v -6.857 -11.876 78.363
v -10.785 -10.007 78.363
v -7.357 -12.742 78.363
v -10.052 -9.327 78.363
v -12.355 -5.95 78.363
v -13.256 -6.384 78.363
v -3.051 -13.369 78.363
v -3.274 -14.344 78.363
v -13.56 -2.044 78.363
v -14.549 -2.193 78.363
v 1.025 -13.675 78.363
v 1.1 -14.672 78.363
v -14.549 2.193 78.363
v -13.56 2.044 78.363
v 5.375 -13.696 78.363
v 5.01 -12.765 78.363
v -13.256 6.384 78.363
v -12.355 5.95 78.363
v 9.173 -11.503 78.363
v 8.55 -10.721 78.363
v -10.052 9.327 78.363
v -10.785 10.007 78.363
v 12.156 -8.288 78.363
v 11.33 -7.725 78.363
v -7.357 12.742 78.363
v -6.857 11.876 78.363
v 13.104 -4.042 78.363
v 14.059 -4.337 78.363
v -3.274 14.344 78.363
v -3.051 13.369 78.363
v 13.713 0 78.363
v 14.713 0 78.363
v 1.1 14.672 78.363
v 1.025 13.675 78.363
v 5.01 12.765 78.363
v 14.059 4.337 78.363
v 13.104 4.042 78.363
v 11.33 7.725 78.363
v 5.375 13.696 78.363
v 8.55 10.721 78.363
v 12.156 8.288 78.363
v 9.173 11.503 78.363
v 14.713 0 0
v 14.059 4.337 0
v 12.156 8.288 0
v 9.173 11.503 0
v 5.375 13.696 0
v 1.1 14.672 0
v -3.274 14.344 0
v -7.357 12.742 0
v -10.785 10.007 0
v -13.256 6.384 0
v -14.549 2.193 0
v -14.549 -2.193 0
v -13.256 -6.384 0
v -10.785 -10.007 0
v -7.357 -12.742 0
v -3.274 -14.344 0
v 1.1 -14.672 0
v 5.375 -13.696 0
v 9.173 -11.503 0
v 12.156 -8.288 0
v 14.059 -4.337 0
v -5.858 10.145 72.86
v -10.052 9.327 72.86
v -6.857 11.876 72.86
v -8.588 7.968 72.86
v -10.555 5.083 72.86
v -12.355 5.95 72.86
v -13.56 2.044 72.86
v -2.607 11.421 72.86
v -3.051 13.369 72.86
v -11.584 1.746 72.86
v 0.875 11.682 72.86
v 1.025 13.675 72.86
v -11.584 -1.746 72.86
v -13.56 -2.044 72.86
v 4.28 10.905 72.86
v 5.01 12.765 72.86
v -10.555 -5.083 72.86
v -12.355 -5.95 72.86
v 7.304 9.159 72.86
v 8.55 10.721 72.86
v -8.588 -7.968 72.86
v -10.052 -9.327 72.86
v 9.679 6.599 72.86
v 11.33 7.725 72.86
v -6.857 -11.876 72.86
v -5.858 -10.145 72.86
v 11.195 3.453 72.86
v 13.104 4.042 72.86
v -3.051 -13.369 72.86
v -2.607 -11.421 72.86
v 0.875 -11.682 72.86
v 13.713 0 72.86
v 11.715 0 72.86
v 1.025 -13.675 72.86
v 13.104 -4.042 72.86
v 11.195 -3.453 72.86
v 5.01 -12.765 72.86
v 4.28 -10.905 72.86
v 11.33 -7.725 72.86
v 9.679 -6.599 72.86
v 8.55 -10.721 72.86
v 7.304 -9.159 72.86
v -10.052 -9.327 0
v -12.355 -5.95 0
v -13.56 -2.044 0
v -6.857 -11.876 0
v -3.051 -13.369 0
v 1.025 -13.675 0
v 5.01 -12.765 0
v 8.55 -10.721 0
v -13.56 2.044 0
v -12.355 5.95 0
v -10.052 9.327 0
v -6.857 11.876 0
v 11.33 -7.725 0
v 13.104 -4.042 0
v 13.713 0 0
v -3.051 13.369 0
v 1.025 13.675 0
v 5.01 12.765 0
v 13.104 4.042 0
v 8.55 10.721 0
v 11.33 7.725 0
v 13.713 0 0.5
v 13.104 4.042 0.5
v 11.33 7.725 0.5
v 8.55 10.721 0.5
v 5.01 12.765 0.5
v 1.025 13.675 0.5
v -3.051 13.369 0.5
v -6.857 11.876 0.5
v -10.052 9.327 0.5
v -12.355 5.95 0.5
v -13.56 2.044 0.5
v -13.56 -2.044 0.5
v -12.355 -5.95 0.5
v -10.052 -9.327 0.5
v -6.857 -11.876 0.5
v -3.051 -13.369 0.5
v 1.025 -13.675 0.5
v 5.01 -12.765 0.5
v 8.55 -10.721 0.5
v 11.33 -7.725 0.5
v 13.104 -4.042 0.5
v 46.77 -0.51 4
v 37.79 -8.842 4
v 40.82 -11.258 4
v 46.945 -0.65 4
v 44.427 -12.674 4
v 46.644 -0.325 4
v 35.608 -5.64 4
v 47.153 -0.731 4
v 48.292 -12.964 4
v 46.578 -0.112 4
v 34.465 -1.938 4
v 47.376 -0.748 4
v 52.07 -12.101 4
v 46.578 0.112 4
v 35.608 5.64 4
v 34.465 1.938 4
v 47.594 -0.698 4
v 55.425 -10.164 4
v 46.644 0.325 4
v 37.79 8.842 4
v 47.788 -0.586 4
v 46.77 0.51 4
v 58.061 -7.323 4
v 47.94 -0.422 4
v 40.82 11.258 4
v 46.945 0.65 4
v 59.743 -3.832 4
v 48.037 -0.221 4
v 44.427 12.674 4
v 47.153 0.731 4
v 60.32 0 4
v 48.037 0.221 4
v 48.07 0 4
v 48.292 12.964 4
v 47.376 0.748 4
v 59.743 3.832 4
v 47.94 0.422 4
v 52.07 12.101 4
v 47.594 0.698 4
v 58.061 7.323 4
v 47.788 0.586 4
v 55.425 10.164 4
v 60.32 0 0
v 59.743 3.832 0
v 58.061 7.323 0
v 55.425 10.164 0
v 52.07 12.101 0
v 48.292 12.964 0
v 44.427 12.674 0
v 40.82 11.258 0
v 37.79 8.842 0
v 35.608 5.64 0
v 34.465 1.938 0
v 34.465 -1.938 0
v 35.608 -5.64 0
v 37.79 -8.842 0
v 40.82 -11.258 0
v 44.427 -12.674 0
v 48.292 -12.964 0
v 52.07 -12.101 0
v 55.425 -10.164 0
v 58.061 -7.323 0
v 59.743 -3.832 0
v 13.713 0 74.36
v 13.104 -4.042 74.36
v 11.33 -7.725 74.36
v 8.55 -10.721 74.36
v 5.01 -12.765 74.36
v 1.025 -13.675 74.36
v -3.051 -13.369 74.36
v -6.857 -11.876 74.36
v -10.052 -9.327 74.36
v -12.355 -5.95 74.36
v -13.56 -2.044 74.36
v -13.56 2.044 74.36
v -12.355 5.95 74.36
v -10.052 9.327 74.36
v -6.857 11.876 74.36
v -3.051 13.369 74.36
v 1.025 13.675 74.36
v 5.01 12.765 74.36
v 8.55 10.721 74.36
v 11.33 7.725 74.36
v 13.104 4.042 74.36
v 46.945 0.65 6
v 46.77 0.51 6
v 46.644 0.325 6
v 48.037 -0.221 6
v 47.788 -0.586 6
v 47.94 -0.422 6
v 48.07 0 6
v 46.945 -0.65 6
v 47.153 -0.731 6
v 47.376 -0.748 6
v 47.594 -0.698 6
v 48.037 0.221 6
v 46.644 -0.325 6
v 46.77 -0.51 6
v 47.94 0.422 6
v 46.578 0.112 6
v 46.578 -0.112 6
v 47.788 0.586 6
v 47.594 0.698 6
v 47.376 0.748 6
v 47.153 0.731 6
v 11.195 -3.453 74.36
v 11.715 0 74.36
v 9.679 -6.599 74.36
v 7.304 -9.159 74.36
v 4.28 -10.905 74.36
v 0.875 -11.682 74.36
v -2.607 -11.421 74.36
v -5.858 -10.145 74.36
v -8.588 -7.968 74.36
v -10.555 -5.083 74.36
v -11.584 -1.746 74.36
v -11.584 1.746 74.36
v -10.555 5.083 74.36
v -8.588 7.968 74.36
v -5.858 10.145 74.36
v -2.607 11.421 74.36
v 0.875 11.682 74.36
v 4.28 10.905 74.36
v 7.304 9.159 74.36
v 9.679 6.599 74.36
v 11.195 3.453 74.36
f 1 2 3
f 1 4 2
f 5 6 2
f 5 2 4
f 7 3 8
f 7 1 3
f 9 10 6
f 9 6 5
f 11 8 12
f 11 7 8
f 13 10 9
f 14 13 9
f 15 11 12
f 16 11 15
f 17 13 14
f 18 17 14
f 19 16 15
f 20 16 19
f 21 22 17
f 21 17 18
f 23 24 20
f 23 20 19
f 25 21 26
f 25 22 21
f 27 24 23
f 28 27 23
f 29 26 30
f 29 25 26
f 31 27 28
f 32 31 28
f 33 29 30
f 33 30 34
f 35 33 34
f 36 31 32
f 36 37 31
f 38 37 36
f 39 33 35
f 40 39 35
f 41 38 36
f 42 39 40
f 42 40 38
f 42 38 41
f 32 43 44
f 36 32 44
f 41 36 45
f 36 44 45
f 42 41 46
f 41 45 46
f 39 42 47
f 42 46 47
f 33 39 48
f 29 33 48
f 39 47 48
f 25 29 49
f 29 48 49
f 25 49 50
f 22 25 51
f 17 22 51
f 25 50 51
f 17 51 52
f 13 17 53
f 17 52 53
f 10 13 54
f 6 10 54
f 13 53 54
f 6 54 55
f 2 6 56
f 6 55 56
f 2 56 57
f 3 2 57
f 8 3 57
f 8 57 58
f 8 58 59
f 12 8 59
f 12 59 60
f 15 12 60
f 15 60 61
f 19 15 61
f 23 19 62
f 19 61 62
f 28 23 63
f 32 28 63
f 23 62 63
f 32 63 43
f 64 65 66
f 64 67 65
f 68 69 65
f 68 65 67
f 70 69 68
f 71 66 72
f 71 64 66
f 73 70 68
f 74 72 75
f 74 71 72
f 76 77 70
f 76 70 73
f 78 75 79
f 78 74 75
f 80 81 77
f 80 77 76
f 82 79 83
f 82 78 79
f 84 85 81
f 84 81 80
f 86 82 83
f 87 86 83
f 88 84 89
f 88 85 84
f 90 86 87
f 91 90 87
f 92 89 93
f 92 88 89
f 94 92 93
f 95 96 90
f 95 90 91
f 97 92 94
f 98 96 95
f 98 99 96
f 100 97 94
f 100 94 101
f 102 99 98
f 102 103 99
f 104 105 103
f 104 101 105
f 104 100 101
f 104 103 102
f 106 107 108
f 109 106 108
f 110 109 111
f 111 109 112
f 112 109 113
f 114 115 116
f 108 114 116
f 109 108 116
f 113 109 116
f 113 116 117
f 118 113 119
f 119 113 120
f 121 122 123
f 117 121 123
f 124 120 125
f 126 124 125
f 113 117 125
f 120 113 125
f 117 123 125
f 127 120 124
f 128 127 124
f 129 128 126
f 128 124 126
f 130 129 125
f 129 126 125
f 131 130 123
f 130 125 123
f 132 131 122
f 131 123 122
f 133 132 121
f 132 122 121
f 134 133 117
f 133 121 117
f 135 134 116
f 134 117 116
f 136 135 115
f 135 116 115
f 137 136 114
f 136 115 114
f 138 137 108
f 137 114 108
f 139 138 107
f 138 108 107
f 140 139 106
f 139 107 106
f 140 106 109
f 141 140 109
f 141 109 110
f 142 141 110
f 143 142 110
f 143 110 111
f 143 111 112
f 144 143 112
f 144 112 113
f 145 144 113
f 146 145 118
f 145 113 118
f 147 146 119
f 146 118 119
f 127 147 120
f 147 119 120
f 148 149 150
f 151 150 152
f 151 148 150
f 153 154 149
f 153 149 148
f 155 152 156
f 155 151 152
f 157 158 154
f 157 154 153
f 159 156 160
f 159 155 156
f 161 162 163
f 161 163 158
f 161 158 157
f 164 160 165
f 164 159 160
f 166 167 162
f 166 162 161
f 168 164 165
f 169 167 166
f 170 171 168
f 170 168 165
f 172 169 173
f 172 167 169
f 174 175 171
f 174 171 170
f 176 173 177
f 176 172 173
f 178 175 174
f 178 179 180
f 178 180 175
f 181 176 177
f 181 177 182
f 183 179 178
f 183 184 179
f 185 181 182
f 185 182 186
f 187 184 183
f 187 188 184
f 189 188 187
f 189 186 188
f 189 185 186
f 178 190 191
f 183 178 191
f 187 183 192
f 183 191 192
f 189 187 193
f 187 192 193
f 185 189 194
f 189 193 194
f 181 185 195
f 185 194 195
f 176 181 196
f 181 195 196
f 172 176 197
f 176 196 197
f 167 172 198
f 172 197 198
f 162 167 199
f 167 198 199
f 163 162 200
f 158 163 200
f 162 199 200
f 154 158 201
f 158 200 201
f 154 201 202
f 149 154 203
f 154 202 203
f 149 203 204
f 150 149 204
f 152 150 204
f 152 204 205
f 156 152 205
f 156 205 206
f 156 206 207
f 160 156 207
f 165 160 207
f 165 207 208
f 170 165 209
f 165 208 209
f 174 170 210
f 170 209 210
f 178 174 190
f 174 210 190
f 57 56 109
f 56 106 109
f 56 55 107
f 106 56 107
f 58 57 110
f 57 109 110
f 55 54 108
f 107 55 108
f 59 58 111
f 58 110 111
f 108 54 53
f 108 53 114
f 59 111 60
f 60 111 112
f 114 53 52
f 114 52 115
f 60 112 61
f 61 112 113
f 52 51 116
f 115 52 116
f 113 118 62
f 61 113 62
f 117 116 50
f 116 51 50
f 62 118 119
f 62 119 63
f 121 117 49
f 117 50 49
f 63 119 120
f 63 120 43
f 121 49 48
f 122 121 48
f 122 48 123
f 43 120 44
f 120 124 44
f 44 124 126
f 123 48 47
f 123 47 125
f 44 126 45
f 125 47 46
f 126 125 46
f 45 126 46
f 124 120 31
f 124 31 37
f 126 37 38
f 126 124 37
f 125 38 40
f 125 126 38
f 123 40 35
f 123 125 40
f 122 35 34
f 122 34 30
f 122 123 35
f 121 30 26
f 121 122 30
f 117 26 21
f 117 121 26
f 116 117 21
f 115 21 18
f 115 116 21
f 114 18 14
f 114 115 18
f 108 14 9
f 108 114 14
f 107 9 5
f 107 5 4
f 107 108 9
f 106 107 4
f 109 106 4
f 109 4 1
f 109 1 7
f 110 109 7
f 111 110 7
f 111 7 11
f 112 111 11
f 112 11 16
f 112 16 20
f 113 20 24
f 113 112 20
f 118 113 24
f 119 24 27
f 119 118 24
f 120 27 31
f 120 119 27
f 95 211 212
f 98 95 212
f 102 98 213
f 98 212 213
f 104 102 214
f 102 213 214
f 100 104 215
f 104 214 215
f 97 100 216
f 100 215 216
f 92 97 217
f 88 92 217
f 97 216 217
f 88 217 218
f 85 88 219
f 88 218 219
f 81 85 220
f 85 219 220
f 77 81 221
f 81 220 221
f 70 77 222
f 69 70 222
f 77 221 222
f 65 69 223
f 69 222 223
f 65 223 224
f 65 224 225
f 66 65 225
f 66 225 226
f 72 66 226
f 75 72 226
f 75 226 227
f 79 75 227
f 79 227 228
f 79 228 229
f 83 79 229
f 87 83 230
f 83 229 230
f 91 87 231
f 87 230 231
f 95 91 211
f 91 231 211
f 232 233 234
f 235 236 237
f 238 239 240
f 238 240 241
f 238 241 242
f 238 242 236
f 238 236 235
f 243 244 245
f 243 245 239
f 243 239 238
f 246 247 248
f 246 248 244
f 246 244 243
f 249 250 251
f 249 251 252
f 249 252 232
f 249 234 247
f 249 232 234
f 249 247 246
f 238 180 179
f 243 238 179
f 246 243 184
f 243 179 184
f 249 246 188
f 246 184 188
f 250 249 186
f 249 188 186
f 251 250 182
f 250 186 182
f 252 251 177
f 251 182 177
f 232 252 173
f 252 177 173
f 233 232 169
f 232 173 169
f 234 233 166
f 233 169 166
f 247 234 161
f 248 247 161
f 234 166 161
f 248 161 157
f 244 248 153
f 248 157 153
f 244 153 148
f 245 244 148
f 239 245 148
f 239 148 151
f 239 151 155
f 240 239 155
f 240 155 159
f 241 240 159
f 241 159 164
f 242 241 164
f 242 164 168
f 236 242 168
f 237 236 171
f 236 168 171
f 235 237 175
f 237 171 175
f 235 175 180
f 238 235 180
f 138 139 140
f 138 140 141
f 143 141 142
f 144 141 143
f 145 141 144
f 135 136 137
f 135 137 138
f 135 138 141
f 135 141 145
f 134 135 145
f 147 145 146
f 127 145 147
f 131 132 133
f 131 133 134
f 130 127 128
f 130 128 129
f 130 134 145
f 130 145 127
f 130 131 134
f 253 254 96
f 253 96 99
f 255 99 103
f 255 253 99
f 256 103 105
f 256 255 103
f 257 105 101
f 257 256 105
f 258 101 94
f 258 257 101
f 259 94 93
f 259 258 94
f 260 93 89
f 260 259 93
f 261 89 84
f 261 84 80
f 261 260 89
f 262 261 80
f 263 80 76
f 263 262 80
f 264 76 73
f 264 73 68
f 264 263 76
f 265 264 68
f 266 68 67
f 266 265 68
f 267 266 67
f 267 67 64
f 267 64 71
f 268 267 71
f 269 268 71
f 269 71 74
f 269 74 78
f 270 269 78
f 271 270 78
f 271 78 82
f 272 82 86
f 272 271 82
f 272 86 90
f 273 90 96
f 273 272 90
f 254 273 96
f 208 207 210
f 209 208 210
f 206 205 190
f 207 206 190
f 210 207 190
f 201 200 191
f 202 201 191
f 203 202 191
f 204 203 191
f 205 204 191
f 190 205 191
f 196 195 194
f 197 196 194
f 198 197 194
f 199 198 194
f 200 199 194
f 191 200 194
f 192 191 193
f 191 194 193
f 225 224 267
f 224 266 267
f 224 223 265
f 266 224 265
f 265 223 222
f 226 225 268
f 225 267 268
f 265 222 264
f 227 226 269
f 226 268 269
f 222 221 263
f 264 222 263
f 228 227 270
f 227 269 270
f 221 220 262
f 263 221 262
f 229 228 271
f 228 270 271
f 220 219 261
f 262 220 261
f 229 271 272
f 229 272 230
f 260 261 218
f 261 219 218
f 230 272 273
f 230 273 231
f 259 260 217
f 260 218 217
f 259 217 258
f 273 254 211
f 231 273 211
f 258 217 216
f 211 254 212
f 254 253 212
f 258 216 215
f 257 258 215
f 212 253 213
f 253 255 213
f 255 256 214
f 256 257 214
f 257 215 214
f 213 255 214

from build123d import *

# Parameters (mm, degrees)
F0_R      = 13.713
F1_DEPTH  = 0.5
F0_R_2    = 14.713
F2_DEPTH  = 78.363
F6_R      = 13.713
F6_R_2    = 11.715
F7_DEPTH  = 1.5
F0_R_3    = 13
F8_DEPTH  = 4
F12_R     = 0.75
F13_DEPTH = 2


with BuildPart() as f1:
    # F0 (on Top) → F1 (new body)
    with BuildSketch(Plane.XY):
        Circle(F0_R)
    extrude(amount=F1_DEPTH)


with BuildPart() as f2:
    # F0 (on Top) → F2 (new body)
    with BuildSketch(Plane.XY):
        Circle(F0_R_2)
        Circle(F0_R, mode=Mode.SUBTRACT)
    extrude(amount=F2_DEPTH)


with BuildPart() as f7:
    # F6 (on 3pt) → F7 (new body)
    with BuildSketch(Plane(origin=(0, 0, 74.36), x_dir=(1, 0, 0), z_dir=(0, 0, -1))):
        Circle(F6_R)
        Circle(F6_R_2, mode=Mode.SUBTRACT)
    extrude(amount=F7_DEPTH)


with BuildPart() as f8:
    # F0 (on Top) → F8 (new body)
    with BuildSketch(Plane.XY):
        with Locations((47.3201088607, 0)):
            Circle(F0_R_3)
    extrude(amount=F8_DEPTH)

    # F12 (on 3pt) → F13 (join)
    with BuildSketch(Plane.XY.offset(4)):
        with Locations((47.32011, 0)):
            Circle(F12_R)
    extrude(amount=F13_DEPTH)


solid = Compound([f1.part, f2.part, f7.part, f8.part])
